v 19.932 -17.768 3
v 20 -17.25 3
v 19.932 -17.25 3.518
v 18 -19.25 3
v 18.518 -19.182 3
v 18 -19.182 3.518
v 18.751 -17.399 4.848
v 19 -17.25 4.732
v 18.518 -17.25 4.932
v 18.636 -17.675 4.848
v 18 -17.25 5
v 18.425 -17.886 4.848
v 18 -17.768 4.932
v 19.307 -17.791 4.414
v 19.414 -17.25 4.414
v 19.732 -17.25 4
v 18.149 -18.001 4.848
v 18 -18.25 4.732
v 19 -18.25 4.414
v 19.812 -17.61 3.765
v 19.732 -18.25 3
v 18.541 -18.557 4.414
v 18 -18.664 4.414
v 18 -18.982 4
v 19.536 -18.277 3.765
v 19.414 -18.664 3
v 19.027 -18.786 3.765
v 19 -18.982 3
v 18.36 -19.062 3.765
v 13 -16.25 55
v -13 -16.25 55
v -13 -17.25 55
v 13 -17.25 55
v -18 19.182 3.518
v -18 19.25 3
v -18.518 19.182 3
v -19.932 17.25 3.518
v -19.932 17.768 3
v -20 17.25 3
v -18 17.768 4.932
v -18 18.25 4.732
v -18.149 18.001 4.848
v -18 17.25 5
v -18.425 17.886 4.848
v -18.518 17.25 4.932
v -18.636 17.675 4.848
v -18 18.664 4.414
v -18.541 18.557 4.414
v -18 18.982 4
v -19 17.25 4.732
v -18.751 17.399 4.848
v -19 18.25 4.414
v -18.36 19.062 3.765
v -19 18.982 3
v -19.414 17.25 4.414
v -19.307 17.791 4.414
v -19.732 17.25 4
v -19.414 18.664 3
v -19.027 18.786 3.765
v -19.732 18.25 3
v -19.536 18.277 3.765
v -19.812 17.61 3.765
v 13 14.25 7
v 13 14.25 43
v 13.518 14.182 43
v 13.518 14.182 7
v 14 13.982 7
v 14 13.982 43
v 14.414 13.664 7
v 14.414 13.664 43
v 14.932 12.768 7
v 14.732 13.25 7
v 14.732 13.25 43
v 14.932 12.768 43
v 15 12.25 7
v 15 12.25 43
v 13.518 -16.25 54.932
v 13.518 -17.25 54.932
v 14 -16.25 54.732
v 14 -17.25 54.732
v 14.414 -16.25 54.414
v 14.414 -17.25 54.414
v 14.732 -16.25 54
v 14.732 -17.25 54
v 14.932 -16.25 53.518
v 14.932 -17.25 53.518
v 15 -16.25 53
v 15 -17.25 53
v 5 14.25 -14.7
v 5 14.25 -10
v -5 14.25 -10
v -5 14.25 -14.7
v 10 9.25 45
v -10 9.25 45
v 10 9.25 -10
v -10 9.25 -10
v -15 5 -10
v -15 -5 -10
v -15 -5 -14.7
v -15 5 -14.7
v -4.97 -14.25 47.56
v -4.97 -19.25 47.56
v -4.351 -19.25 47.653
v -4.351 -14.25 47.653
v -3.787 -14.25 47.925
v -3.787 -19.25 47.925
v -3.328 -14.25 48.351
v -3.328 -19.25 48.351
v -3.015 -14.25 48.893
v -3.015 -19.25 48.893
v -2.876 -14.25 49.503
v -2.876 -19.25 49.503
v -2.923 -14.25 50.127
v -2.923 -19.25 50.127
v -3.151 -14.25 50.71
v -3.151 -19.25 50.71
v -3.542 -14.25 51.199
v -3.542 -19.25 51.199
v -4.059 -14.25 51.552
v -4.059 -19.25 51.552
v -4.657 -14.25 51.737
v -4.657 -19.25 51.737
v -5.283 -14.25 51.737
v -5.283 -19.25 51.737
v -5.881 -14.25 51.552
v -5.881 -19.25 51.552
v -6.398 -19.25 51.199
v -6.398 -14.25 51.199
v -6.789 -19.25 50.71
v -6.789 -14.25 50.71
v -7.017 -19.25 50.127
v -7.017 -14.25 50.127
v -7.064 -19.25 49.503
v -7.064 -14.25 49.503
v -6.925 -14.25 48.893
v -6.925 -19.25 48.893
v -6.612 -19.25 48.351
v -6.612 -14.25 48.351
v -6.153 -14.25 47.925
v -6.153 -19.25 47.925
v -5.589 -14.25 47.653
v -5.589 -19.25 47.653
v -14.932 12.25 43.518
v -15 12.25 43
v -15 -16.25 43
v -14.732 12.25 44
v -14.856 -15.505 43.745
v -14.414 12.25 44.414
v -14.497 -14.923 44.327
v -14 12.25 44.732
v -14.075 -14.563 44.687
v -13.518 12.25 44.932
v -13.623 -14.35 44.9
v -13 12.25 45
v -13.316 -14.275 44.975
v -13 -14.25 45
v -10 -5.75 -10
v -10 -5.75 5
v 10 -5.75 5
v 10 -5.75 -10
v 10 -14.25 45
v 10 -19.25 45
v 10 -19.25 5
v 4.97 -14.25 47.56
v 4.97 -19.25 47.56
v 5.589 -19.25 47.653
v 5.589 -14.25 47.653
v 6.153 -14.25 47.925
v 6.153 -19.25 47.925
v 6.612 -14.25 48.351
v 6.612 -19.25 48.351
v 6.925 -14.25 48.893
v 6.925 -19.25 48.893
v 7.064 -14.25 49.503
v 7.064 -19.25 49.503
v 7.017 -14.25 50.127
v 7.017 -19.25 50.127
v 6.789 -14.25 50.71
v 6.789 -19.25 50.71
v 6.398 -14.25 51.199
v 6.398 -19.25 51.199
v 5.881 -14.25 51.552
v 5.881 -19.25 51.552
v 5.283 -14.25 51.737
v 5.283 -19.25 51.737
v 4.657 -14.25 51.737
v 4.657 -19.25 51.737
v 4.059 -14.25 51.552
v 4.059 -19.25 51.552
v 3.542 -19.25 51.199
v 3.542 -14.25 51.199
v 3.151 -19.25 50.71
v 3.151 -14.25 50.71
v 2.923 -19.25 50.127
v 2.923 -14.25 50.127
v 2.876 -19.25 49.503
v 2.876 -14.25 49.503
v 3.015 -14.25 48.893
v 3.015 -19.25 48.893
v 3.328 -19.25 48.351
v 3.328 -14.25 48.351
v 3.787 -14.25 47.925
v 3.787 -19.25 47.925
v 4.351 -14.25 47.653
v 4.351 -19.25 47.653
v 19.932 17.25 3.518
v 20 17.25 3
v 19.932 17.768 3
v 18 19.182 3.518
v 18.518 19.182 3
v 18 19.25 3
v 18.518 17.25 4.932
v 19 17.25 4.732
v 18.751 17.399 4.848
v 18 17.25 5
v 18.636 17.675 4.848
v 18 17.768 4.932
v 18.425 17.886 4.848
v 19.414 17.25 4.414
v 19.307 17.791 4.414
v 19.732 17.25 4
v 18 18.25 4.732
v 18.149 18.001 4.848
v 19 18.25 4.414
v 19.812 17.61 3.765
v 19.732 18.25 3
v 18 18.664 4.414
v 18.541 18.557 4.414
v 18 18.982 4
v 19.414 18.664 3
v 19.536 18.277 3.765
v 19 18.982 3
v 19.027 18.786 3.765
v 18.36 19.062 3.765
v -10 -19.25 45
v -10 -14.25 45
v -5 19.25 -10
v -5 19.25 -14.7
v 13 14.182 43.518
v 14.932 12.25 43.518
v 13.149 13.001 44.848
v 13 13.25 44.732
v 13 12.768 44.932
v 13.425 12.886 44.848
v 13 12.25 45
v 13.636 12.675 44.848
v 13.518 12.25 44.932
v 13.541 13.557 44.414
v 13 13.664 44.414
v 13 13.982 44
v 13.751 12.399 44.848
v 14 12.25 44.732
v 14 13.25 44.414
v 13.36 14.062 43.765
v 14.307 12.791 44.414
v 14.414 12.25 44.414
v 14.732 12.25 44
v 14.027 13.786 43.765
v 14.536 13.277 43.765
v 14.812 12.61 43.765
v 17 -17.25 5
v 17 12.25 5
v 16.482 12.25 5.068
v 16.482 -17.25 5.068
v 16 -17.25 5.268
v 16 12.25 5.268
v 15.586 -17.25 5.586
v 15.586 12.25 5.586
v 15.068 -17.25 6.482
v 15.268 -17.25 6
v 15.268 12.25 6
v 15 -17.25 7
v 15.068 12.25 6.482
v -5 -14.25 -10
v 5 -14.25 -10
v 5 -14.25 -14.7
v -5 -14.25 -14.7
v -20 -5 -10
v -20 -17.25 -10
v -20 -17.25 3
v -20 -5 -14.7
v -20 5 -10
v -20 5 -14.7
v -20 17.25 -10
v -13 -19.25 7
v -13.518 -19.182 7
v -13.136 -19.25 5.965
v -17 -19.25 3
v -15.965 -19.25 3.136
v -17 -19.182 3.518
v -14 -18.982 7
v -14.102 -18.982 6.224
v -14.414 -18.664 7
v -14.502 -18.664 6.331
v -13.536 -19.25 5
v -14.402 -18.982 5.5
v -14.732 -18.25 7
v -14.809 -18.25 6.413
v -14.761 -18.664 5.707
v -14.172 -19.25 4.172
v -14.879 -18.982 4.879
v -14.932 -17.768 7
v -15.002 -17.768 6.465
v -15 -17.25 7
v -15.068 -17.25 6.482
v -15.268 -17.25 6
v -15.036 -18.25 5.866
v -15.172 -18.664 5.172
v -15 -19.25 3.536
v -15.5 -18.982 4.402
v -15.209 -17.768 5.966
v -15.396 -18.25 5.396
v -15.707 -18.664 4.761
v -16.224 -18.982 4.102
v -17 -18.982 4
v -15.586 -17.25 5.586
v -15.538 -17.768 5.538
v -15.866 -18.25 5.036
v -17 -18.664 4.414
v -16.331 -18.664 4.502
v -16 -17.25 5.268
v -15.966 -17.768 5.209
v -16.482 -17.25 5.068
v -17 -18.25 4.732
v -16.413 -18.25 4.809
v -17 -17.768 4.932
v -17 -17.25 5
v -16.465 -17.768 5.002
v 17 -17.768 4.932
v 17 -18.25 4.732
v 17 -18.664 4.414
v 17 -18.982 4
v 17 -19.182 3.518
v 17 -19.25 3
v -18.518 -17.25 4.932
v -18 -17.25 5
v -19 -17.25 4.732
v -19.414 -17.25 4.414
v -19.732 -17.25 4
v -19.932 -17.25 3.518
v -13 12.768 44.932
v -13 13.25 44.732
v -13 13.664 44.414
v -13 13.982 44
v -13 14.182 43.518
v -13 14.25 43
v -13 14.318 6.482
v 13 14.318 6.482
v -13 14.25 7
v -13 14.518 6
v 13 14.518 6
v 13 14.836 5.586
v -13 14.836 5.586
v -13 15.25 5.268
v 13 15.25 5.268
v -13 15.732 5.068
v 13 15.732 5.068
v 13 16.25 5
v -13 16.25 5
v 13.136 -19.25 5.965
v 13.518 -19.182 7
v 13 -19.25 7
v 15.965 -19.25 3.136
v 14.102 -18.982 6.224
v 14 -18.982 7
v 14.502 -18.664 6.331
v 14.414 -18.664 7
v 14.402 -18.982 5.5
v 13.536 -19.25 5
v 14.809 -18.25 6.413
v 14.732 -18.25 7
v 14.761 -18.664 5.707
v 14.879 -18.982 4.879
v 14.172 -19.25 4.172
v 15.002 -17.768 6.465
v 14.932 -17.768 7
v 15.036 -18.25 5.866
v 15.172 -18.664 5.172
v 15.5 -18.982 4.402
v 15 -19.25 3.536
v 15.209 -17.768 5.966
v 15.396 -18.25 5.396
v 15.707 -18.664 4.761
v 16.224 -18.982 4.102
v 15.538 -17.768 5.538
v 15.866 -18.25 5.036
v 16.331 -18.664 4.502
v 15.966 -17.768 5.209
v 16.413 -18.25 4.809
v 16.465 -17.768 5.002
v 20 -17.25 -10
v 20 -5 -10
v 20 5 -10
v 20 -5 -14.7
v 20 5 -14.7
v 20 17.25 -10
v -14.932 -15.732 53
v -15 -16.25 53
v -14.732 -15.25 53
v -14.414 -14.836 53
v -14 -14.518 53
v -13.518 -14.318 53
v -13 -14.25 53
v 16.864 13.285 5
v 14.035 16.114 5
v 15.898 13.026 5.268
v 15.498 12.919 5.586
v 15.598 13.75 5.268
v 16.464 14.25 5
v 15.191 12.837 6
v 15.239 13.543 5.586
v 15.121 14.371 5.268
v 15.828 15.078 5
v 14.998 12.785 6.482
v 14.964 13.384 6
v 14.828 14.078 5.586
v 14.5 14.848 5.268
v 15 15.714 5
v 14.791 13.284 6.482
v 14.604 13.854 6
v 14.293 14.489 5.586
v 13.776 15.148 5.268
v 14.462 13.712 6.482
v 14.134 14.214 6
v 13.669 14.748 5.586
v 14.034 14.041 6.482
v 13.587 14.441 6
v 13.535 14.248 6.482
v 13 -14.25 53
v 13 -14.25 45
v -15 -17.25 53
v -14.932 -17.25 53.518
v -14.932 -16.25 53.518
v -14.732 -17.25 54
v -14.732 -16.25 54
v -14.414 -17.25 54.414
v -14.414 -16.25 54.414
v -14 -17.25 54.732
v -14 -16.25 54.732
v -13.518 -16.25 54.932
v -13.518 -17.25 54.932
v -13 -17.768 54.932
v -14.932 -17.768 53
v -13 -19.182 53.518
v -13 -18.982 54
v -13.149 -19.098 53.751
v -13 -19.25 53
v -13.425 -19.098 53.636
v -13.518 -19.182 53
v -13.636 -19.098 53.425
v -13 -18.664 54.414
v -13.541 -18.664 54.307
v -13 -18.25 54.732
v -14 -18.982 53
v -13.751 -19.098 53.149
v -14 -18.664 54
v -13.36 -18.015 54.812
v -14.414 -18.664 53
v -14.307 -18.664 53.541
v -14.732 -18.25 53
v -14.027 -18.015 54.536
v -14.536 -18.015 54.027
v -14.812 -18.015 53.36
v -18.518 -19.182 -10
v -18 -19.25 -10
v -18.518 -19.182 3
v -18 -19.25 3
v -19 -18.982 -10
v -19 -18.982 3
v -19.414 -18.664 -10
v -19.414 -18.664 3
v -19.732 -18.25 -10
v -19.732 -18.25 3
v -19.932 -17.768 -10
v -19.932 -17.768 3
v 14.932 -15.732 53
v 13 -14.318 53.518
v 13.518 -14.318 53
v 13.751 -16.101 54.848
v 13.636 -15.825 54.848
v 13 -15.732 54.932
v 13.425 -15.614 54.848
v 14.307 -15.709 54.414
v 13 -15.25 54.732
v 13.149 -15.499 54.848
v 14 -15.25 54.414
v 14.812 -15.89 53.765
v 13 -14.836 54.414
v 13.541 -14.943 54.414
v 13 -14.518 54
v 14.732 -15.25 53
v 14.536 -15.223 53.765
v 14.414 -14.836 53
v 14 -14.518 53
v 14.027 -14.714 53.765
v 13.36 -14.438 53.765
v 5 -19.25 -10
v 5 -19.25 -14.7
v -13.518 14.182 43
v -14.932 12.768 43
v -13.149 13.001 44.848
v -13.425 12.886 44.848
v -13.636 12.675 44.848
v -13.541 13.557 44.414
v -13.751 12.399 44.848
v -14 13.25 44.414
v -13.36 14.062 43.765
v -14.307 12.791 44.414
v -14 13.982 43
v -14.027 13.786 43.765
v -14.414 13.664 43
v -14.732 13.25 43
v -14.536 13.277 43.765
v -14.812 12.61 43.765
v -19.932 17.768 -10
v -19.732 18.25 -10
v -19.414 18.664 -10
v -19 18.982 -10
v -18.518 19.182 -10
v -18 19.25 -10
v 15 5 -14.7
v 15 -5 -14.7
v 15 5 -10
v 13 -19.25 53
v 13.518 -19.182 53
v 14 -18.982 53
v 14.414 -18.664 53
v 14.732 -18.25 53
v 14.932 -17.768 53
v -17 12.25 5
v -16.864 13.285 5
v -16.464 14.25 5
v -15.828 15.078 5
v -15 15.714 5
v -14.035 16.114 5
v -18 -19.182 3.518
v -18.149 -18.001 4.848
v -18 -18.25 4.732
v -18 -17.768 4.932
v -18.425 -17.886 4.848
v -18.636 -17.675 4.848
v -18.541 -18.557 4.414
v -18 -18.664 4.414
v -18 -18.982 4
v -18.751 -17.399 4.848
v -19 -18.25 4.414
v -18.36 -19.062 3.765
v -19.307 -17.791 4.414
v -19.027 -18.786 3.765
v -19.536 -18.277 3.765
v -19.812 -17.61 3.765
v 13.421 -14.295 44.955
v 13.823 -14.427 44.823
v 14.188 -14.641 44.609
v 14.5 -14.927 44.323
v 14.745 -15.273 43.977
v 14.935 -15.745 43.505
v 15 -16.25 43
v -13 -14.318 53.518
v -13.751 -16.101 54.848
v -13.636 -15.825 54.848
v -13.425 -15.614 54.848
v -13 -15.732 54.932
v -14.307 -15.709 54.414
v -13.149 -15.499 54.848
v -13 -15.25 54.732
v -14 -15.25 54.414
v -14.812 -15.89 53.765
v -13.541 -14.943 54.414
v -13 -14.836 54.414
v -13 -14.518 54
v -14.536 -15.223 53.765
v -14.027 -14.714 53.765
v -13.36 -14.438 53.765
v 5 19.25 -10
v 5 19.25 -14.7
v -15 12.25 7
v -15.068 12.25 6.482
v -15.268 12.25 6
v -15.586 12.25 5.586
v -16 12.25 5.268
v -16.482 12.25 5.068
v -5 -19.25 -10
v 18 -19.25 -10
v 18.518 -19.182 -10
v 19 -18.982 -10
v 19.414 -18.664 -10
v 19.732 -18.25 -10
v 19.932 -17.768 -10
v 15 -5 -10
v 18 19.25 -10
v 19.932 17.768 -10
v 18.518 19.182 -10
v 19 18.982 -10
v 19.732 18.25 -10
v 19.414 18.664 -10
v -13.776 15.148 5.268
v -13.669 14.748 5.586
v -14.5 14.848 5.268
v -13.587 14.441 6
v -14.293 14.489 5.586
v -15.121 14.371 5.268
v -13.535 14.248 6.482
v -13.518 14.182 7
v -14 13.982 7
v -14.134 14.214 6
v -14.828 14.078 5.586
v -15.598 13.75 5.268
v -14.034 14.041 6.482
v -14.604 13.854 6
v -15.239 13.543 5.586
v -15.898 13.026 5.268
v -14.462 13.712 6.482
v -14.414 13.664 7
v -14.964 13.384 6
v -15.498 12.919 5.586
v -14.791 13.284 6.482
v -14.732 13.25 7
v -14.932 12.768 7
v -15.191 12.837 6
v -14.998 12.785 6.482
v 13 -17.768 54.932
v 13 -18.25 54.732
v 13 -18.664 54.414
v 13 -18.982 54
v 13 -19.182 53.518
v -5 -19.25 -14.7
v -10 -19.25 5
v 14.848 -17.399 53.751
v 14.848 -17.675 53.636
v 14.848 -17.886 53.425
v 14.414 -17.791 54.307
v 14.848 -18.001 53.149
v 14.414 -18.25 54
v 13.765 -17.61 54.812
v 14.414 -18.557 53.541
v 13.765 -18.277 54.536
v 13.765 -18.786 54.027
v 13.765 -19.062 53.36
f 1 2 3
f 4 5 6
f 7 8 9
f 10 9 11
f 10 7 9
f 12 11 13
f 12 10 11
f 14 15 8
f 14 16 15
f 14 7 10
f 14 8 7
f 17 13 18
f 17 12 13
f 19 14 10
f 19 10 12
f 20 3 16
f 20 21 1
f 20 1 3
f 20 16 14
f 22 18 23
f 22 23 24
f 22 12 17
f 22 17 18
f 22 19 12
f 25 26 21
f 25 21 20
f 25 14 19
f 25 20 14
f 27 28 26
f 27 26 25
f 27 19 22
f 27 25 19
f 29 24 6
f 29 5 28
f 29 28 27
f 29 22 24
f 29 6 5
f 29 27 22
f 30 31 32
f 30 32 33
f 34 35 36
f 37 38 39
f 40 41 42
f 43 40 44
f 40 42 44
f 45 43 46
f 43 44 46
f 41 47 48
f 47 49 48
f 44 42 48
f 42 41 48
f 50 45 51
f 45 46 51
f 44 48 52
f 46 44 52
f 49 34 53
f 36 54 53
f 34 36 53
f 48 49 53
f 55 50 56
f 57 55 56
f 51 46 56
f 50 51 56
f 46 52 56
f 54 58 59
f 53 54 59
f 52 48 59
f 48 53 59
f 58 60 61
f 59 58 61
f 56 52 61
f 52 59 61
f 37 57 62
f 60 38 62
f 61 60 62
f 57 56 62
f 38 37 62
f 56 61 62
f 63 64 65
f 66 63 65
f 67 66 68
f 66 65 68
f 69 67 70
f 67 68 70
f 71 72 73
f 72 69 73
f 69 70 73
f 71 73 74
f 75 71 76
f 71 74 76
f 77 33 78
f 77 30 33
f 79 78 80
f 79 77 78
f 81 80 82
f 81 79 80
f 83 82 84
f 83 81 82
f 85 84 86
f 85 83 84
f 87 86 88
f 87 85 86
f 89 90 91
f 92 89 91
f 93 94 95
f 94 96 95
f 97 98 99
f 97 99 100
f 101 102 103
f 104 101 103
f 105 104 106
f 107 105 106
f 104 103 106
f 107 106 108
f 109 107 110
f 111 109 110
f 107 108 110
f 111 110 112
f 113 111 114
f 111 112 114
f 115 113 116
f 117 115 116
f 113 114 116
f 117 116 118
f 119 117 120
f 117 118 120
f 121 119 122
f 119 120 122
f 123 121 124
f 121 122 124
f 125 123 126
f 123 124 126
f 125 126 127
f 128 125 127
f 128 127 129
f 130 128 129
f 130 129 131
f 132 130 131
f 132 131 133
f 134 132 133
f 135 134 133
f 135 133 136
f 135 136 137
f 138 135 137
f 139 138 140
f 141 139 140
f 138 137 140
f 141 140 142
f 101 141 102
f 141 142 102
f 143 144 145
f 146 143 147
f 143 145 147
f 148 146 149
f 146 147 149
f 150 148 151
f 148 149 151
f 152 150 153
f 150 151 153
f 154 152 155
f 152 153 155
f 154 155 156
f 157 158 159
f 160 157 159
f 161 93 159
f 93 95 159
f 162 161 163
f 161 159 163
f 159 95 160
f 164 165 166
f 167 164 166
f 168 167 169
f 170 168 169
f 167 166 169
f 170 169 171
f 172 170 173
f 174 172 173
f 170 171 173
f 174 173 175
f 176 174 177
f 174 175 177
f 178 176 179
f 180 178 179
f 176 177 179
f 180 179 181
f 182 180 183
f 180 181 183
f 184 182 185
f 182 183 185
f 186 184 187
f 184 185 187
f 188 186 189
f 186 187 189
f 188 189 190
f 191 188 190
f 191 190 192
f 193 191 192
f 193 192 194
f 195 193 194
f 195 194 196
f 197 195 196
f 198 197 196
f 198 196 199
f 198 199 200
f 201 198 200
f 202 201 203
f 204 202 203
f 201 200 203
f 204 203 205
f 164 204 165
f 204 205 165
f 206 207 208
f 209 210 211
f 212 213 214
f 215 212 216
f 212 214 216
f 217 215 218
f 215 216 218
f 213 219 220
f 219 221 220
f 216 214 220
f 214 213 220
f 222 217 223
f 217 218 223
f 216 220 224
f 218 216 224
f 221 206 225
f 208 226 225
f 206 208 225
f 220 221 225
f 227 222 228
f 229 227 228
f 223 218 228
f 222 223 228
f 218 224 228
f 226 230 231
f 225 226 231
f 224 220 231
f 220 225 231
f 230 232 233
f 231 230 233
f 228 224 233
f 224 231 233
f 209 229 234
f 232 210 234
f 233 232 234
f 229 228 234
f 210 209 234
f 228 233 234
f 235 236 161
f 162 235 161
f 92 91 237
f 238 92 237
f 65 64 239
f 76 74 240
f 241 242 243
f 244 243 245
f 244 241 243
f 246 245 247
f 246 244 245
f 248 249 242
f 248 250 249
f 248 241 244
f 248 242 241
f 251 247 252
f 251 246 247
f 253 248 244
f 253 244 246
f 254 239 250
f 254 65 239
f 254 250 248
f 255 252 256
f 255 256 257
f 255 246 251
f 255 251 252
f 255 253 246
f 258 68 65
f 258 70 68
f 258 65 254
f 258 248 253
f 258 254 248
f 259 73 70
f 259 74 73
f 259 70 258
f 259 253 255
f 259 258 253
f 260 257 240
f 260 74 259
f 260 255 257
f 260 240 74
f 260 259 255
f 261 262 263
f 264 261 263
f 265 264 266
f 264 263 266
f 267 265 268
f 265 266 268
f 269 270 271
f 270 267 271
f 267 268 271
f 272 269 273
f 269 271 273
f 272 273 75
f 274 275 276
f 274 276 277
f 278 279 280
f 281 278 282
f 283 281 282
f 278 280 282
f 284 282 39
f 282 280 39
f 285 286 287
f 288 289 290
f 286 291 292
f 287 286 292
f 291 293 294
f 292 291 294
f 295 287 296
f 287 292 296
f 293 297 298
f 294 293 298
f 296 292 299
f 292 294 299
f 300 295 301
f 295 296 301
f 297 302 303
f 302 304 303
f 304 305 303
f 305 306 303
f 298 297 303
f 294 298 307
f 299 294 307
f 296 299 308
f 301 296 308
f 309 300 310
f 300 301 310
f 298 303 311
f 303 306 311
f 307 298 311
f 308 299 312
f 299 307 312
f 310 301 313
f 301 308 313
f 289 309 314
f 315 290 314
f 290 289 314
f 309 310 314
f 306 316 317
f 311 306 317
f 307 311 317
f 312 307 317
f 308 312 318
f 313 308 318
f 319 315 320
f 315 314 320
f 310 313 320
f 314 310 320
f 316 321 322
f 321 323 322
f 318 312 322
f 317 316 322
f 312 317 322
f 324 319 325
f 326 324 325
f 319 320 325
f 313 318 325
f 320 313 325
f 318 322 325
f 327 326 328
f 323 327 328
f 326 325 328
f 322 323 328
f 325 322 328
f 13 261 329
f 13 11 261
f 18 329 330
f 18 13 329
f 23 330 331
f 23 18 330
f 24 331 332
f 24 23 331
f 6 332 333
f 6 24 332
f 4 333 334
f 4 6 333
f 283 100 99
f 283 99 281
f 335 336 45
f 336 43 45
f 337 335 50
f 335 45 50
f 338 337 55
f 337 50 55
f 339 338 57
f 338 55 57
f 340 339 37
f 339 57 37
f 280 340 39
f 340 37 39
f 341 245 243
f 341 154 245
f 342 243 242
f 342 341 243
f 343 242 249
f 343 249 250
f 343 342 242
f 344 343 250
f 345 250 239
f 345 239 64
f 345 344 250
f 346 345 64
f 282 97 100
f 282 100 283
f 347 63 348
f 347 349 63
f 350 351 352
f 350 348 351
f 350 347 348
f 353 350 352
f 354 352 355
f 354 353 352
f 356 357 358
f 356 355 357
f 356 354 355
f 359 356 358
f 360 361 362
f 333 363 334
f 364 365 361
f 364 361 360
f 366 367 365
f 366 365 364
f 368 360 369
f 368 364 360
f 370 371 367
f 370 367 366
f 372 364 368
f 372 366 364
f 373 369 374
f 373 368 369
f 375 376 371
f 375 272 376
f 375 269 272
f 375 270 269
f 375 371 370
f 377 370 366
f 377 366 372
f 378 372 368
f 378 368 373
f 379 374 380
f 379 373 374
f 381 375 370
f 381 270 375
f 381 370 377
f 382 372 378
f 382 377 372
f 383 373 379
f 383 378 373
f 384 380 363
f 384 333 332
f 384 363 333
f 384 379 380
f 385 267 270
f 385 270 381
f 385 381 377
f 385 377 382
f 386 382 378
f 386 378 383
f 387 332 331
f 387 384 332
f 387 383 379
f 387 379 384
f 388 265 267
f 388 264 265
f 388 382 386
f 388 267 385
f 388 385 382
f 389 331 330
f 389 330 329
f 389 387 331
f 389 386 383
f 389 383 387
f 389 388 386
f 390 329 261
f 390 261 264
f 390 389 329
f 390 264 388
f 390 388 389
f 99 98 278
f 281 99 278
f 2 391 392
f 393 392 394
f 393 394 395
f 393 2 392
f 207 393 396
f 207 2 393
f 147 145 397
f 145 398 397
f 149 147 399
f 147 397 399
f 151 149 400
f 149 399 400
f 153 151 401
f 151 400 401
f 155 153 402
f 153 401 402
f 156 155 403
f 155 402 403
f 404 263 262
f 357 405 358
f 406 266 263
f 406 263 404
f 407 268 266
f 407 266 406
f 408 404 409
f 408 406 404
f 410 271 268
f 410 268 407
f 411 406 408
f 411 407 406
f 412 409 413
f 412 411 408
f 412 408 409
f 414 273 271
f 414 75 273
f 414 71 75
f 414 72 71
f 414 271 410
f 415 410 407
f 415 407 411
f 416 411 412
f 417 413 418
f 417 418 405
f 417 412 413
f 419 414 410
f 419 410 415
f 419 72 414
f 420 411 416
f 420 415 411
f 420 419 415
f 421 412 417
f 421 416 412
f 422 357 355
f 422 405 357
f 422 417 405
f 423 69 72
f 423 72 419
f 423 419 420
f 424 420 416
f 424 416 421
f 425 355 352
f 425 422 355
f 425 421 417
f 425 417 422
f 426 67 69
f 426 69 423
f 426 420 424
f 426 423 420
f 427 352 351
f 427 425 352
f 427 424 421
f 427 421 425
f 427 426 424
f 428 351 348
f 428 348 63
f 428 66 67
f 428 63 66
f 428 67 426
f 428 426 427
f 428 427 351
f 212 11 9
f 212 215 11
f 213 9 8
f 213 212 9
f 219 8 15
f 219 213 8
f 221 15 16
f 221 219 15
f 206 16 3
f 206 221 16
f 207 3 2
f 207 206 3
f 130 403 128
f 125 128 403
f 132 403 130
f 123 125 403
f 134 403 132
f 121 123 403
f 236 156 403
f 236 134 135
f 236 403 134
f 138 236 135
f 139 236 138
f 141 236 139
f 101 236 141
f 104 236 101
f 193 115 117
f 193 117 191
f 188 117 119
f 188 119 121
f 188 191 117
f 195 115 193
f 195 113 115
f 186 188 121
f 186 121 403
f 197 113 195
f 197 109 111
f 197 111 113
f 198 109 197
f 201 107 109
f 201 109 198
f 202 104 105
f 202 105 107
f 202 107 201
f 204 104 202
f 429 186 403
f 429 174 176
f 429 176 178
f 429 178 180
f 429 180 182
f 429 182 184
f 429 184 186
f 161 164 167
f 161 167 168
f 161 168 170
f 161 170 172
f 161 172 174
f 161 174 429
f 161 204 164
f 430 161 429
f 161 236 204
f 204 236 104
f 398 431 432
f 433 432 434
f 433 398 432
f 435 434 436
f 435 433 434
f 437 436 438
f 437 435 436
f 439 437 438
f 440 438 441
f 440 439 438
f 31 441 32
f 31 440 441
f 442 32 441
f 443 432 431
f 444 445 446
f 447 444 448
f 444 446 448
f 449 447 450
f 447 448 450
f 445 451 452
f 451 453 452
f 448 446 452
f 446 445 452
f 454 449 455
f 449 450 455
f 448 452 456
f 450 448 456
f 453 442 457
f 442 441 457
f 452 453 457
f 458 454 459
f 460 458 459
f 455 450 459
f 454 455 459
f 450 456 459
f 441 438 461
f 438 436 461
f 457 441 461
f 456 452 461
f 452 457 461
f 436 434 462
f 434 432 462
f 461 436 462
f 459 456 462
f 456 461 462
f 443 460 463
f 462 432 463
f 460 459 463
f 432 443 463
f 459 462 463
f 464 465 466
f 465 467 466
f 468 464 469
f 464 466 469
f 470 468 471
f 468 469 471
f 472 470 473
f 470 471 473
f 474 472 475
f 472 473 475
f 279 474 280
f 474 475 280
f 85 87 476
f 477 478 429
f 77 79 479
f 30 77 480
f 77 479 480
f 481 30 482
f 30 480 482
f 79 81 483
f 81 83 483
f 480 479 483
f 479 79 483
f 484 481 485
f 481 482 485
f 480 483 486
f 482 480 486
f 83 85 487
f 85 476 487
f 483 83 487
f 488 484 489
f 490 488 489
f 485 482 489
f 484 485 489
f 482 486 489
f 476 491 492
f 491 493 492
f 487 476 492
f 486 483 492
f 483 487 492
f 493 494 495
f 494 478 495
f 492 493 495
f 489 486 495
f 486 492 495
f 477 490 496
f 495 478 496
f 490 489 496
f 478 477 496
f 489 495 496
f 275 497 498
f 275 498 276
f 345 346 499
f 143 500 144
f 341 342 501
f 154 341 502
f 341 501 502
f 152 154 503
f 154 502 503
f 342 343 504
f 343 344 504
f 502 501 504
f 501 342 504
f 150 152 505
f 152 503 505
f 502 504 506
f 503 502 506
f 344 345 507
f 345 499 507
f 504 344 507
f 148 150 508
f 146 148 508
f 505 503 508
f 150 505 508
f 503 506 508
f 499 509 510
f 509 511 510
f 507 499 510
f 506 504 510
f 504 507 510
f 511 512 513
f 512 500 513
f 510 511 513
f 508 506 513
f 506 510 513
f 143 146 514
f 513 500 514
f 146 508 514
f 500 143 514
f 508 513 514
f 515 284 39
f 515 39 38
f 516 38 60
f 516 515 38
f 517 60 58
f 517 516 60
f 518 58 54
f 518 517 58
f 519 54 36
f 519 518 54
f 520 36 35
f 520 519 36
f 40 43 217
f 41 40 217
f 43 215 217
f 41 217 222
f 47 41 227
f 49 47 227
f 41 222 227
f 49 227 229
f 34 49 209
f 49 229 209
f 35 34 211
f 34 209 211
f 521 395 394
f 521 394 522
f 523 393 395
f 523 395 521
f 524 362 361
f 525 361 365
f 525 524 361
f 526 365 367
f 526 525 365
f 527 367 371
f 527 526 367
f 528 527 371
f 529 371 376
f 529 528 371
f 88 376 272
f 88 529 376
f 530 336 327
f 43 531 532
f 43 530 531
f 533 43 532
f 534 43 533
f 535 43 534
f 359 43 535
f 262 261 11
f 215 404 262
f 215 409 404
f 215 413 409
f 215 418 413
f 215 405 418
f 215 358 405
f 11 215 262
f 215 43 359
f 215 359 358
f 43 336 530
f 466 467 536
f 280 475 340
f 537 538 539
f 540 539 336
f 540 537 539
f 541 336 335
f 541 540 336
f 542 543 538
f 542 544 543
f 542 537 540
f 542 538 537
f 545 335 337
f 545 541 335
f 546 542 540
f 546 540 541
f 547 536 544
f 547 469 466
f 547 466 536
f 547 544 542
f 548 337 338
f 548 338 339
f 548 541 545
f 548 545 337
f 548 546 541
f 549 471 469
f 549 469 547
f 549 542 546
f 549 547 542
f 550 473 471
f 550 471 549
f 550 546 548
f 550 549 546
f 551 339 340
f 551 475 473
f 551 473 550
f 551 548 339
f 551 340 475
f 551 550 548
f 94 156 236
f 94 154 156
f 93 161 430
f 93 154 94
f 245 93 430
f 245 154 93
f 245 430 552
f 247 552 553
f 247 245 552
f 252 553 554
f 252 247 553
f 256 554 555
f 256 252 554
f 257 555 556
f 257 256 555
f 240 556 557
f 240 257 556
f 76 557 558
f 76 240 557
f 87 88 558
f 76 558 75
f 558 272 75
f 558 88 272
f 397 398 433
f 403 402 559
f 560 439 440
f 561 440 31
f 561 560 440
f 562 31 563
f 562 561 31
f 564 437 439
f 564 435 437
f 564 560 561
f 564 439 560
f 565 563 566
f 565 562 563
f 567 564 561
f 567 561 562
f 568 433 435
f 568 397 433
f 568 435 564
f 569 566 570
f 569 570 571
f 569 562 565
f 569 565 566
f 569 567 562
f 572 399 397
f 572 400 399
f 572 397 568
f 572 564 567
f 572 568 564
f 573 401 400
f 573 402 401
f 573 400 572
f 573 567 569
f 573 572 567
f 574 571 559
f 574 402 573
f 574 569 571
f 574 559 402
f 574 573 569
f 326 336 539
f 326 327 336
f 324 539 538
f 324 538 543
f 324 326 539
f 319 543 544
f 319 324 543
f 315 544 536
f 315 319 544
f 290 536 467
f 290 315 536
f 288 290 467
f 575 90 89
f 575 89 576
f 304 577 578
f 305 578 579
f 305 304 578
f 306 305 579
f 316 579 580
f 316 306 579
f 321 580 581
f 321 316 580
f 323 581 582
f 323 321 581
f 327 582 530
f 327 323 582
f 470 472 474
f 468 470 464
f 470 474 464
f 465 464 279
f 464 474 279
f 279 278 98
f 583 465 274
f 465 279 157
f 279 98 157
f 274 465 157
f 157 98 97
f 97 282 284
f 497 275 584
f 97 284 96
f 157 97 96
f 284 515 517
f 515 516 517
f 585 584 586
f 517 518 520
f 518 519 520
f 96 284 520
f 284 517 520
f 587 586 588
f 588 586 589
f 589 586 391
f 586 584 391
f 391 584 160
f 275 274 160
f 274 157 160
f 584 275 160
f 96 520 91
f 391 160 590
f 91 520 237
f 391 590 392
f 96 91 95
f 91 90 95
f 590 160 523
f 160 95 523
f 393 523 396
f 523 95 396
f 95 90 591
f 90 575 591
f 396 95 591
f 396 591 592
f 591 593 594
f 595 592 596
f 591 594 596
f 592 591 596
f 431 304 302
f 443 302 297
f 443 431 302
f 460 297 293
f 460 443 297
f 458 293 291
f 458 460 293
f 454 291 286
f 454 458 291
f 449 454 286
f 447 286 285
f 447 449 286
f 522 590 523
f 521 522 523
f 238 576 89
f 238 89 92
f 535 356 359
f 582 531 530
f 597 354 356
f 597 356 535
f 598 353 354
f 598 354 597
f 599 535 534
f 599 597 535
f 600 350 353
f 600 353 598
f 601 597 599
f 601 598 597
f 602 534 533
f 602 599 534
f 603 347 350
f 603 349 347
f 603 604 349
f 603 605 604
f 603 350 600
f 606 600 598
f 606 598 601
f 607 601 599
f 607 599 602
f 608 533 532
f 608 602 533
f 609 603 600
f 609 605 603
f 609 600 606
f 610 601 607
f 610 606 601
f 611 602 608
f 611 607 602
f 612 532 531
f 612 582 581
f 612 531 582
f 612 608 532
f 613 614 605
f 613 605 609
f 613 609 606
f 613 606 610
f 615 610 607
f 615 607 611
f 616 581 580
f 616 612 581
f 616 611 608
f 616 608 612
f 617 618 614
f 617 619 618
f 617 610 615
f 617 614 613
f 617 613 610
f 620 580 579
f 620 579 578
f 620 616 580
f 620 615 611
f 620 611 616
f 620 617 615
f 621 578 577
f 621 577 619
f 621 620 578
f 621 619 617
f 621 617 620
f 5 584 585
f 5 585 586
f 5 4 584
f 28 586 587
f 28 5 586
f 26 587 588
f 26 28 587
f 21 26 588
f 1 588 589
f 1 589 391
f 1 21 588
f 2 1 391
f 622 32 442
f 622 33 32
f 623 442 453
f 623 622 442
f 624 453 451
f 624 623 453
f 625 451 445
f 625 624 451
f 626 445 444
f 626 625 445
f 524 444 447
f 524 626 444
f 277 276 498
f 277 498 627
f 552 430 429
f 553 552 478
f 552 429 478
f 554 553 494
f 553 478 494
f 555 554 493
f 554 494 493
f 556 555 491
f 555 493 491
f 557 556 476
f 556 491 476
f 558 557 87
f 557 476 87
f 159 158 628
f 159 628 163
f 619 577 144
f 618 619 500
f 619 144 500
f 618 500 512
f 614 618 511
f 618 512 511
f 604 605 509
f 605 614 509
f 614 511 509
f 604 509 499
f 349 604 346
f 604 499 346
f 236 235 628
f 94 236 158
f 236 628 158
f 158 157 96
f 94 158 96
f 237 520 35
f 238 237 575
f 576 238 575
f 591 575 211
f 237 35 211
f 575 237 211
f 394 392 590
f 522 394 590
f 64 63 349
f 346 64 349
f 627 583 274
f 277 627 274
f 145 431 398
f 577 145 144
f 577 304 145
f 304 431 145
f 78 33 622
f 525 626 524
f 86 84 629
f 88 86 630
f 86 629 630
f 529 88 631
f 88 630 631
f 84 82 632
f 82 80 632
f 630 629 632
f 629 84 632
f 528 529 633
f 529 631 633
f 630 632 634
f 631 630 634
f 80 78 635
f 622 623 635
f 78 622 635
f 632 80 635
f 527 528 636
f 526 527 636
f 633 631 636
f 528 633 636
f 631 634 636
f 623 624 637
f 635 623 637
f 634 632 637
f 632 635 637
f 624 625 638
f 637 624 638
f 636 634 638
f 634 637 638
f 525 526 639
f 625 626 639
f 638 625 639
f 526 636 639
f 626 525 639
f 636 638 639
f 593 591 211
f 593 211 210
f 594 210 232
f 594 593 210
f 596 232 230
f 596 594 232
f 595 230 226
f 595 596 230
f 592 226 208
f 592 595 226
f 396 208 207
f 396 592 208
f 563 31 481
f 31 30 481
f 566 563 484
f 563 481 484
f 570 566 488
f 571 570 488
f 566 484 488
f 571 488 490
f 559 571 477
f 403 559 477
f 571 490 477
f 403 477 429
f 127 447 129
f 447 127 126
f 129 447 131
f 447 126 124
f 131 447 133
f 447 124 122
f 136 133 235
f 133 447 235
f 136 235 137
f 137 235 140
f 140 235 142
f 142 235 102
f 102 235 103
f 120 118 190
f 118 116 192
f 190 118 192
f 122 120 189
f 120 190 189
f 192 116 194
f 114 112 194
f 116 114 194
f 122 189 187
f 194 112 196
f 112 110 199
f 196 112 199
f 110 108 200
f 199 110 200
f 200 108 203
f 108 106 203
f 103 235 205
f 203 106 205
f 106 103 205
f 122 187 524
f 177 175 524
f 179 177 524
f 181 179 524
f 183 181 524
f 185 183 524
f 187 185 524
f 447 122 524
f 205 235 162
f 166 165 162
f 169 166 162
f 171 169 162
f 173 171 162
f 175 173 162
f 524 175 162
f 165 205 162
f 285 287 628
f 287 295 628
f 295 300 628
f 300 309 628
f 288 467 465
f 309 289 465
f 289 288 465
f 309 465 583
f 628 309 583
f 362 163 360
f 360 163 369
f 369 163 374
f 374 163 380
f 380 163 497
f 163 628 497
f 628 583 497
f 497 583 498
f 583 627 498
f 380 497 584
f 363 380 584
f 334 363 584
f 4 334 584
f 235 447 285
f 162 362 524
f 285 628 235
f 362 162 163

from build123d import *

# Parameters (mm, degrees)
SKETCH1_W           = 30
SKETCH1_H           = 33.5
SKETCH1_W_2         = 20
SKETCH1_H_2         = 23.5
BOSS_EXTRUDE1_DEPTH = 10
SKETCH1_4_W         = 30
SKETCH1_4_H         = 33.5
SKETCH1_4_W_2       = 20
SKETCH1_4_H_2       = 23.5
BOSS_EXTRUDE2_DEPTH = 5
SKETCH2_W           = 40
SKETCH2_H           = 38.5
BOSS_EXTRUDE3_DEPTH = 10
BOSS_EXTRUDE4_DEPTH = 40
SKETCH4_W           = 30
SKETCH4_H           = 5
BOSS_EXTRUDE5_DEPTH = 10
SKETCH5_R           = 2.1
CUT_EXTRUDE1_DEPTH  = 5
FILLET1_R           = 2
SKETCH6_W           = 10
SKETCH6_H           = 5
SKETCH6_W_2         = 5
SKETCH6_H_2         = 10
BOSS_EXTRUDE6_DEPTH = 4.7
SKETCH7_W           = 20
SKETCH7_H           = 15
CUT_EXTRUDE2_DEPTH  = 15


with BuildPart() as part:
    # Sketch1 → Boss-Extrude1 (new body)
    # profile 1 of 3: a face of its own
    with BuildSketch(Plane.XY):
        Polygon((-20, 19.25), (-20, -19.25), (-15, -19.25), (-15, 14.25), (15, 14.25), (15, -19.25), (20, -19.25), (20, 19.25), align=None)
    # profile 2 of 3: a face of its own
    with BuildSketch(Plane.XY):
        with Locations((0, -2.5)):
            Rectangle(SKETCH1_W, SKETCH1_H)
        with Locations((0, -2.5)):
            Rectangle(SKETCH1_W_2, SKETCH1_H_2, mode=Mode.SUBTRACT)
    # profile 3 of 3: a face of its own
    with BuildSketch(Plane.XY):
        with Locations((0, -2.5)):
            Rectangle(SKETCH1_W_2, SKETCH1_H_2)
    extrude(amount=-BOSS_EXTRUDE1_DEPTH)

    # Sketch1<4> → Boss-Extrude2 (add)
    with BuildSketch(Plane.XY):
        with Locations((0, -2.5)):
            Rectangle(SKETCH1_4_W, SKETCH1_4_H)
        with Locations((0, -2.5)):
            Rectangle(SKETCH1_4_W_2, SKETCH1_4_H_2, mode=Mode.SUBTRACT)
    extrude(amount=BOSS_EXTRUDE2_DEPTH)

    # Sketch2 → Boss-Extrude3 (add)
    with BuildSketch(Plane.XY.offset(5)):
        Rectangle(SKETCH2_W, SKETCH2_H)
    extrude(amount=-BOSS_EXTRUDE3_DEPTH)

    # Sketch3 → Boss-Extrude4 (add)
    with BuildSketch(Plane.XY.offset(5)):
        Polygon((-10, -19.25), (-10, -14.25), (-10, 9.25), (10, 9.25), (10, -14.25), (10, -19.25), (15, -19.25), (15, 14.25), (-15, 14.25), (-15, -19.25), align=None)
    extrude(amount=BOSS_EXTRUDE4_DEPTH)

    # Sketch4 → Boss-Extrude5 (add)
    with BuildSketch(Plane.XY.offset(45)):
        with Locations((0, -16.75)):
            Rectangle(SKETCH4_W, SKETCH4_H)
    extrude(amount=BOSS_EXTRUDE5_DEPTH)

    # Sketch5 → Cut-Extrude1 (cut)
    with BuildSketch(Plane.XZ.offset(19.25)):
        with Locations(Location((4.97, 49.66, 0), (0, 0, 270))):
            Circle(SKETCH5_R)
        with Locations(Location((-4.97, 49.66, 0), (0, 0, 270))):
            Circle(SKETCH5_R)
    extrude(amount=-CUT_EXTRUDE1_DEPTH, mode=Mode.SUBTRACT)

    # Fillet1
    fillet1_edges = [part.edges().sort_by_distance(p)[0] for p in [
        (-15, -14.25, 50),
        (15, -14.25, 50),
        (-15, -16.75, 55),
        (-20, 19.25, -2.5),
        (0, -19.25, 55),
        (15, -16.75, 55),
        (0, -14.25, 55),
        (20, 19.25, -2.5),
        (20, -19.25, -2.5),
        (-20, -19.25, -2.5),
        (-17.5, -19.25, 5),
        (20, 0, 5),
        (0, 19.25, 5),
        (-20, 0, 5),
        (17.5, -19.25, 5),
        (0, 14.25, 5),
        (15, 14.25, 25),
        (-15, -2.5, 5),
        (-15, 14.25, 25),
        (-15, -19.25, 30),
        (15, -2.5, 5),
        (15, -19.25, 30),
        (0, 14.25, 45),
        (-15, 0, 45),
        (15, 0, 45),
    ]]
    fillet(fillet1_edges, radius=FILLET1_R)

    # Sketch6 → Boss-Extrude6 (add)
    with BuildSketch(Plane(origin=(0, 0, -10), x_dir=(-1, 0, 0), z_dir=(0, 0, -1))):
        with Locations((0, -16.75)):
            Rectangle(SKETCH6_W, SKETCH6_H)
        with Locations((17.5, 0)):
            Rectangle(SKETCH6_W_2, SKETCH6_H_2)
        with Locations((0, 16.75)):
            Rectangle(SKETCH6_W, SKETCH6_H)
        with Locations((-17.5, 0)):
            Rectangle(SKETCH6_W_2, SKETCH6_H_2)
    extrude(amount=BOSS_EXTRUDE6_DEPTH)

    # Sketch7 → Cut-Extrude2 (cut)
    with BuildSketch(Plane.XY.offset(5)):
        with Locations((0, 1.75)):
            Rectangle(SKETCH7_W, SKETCH7_H)
    extrude(amount=-CUT_EXTRUDE2_DEPTH, mode=Mode.SUBTRACT)


solid = part.part
